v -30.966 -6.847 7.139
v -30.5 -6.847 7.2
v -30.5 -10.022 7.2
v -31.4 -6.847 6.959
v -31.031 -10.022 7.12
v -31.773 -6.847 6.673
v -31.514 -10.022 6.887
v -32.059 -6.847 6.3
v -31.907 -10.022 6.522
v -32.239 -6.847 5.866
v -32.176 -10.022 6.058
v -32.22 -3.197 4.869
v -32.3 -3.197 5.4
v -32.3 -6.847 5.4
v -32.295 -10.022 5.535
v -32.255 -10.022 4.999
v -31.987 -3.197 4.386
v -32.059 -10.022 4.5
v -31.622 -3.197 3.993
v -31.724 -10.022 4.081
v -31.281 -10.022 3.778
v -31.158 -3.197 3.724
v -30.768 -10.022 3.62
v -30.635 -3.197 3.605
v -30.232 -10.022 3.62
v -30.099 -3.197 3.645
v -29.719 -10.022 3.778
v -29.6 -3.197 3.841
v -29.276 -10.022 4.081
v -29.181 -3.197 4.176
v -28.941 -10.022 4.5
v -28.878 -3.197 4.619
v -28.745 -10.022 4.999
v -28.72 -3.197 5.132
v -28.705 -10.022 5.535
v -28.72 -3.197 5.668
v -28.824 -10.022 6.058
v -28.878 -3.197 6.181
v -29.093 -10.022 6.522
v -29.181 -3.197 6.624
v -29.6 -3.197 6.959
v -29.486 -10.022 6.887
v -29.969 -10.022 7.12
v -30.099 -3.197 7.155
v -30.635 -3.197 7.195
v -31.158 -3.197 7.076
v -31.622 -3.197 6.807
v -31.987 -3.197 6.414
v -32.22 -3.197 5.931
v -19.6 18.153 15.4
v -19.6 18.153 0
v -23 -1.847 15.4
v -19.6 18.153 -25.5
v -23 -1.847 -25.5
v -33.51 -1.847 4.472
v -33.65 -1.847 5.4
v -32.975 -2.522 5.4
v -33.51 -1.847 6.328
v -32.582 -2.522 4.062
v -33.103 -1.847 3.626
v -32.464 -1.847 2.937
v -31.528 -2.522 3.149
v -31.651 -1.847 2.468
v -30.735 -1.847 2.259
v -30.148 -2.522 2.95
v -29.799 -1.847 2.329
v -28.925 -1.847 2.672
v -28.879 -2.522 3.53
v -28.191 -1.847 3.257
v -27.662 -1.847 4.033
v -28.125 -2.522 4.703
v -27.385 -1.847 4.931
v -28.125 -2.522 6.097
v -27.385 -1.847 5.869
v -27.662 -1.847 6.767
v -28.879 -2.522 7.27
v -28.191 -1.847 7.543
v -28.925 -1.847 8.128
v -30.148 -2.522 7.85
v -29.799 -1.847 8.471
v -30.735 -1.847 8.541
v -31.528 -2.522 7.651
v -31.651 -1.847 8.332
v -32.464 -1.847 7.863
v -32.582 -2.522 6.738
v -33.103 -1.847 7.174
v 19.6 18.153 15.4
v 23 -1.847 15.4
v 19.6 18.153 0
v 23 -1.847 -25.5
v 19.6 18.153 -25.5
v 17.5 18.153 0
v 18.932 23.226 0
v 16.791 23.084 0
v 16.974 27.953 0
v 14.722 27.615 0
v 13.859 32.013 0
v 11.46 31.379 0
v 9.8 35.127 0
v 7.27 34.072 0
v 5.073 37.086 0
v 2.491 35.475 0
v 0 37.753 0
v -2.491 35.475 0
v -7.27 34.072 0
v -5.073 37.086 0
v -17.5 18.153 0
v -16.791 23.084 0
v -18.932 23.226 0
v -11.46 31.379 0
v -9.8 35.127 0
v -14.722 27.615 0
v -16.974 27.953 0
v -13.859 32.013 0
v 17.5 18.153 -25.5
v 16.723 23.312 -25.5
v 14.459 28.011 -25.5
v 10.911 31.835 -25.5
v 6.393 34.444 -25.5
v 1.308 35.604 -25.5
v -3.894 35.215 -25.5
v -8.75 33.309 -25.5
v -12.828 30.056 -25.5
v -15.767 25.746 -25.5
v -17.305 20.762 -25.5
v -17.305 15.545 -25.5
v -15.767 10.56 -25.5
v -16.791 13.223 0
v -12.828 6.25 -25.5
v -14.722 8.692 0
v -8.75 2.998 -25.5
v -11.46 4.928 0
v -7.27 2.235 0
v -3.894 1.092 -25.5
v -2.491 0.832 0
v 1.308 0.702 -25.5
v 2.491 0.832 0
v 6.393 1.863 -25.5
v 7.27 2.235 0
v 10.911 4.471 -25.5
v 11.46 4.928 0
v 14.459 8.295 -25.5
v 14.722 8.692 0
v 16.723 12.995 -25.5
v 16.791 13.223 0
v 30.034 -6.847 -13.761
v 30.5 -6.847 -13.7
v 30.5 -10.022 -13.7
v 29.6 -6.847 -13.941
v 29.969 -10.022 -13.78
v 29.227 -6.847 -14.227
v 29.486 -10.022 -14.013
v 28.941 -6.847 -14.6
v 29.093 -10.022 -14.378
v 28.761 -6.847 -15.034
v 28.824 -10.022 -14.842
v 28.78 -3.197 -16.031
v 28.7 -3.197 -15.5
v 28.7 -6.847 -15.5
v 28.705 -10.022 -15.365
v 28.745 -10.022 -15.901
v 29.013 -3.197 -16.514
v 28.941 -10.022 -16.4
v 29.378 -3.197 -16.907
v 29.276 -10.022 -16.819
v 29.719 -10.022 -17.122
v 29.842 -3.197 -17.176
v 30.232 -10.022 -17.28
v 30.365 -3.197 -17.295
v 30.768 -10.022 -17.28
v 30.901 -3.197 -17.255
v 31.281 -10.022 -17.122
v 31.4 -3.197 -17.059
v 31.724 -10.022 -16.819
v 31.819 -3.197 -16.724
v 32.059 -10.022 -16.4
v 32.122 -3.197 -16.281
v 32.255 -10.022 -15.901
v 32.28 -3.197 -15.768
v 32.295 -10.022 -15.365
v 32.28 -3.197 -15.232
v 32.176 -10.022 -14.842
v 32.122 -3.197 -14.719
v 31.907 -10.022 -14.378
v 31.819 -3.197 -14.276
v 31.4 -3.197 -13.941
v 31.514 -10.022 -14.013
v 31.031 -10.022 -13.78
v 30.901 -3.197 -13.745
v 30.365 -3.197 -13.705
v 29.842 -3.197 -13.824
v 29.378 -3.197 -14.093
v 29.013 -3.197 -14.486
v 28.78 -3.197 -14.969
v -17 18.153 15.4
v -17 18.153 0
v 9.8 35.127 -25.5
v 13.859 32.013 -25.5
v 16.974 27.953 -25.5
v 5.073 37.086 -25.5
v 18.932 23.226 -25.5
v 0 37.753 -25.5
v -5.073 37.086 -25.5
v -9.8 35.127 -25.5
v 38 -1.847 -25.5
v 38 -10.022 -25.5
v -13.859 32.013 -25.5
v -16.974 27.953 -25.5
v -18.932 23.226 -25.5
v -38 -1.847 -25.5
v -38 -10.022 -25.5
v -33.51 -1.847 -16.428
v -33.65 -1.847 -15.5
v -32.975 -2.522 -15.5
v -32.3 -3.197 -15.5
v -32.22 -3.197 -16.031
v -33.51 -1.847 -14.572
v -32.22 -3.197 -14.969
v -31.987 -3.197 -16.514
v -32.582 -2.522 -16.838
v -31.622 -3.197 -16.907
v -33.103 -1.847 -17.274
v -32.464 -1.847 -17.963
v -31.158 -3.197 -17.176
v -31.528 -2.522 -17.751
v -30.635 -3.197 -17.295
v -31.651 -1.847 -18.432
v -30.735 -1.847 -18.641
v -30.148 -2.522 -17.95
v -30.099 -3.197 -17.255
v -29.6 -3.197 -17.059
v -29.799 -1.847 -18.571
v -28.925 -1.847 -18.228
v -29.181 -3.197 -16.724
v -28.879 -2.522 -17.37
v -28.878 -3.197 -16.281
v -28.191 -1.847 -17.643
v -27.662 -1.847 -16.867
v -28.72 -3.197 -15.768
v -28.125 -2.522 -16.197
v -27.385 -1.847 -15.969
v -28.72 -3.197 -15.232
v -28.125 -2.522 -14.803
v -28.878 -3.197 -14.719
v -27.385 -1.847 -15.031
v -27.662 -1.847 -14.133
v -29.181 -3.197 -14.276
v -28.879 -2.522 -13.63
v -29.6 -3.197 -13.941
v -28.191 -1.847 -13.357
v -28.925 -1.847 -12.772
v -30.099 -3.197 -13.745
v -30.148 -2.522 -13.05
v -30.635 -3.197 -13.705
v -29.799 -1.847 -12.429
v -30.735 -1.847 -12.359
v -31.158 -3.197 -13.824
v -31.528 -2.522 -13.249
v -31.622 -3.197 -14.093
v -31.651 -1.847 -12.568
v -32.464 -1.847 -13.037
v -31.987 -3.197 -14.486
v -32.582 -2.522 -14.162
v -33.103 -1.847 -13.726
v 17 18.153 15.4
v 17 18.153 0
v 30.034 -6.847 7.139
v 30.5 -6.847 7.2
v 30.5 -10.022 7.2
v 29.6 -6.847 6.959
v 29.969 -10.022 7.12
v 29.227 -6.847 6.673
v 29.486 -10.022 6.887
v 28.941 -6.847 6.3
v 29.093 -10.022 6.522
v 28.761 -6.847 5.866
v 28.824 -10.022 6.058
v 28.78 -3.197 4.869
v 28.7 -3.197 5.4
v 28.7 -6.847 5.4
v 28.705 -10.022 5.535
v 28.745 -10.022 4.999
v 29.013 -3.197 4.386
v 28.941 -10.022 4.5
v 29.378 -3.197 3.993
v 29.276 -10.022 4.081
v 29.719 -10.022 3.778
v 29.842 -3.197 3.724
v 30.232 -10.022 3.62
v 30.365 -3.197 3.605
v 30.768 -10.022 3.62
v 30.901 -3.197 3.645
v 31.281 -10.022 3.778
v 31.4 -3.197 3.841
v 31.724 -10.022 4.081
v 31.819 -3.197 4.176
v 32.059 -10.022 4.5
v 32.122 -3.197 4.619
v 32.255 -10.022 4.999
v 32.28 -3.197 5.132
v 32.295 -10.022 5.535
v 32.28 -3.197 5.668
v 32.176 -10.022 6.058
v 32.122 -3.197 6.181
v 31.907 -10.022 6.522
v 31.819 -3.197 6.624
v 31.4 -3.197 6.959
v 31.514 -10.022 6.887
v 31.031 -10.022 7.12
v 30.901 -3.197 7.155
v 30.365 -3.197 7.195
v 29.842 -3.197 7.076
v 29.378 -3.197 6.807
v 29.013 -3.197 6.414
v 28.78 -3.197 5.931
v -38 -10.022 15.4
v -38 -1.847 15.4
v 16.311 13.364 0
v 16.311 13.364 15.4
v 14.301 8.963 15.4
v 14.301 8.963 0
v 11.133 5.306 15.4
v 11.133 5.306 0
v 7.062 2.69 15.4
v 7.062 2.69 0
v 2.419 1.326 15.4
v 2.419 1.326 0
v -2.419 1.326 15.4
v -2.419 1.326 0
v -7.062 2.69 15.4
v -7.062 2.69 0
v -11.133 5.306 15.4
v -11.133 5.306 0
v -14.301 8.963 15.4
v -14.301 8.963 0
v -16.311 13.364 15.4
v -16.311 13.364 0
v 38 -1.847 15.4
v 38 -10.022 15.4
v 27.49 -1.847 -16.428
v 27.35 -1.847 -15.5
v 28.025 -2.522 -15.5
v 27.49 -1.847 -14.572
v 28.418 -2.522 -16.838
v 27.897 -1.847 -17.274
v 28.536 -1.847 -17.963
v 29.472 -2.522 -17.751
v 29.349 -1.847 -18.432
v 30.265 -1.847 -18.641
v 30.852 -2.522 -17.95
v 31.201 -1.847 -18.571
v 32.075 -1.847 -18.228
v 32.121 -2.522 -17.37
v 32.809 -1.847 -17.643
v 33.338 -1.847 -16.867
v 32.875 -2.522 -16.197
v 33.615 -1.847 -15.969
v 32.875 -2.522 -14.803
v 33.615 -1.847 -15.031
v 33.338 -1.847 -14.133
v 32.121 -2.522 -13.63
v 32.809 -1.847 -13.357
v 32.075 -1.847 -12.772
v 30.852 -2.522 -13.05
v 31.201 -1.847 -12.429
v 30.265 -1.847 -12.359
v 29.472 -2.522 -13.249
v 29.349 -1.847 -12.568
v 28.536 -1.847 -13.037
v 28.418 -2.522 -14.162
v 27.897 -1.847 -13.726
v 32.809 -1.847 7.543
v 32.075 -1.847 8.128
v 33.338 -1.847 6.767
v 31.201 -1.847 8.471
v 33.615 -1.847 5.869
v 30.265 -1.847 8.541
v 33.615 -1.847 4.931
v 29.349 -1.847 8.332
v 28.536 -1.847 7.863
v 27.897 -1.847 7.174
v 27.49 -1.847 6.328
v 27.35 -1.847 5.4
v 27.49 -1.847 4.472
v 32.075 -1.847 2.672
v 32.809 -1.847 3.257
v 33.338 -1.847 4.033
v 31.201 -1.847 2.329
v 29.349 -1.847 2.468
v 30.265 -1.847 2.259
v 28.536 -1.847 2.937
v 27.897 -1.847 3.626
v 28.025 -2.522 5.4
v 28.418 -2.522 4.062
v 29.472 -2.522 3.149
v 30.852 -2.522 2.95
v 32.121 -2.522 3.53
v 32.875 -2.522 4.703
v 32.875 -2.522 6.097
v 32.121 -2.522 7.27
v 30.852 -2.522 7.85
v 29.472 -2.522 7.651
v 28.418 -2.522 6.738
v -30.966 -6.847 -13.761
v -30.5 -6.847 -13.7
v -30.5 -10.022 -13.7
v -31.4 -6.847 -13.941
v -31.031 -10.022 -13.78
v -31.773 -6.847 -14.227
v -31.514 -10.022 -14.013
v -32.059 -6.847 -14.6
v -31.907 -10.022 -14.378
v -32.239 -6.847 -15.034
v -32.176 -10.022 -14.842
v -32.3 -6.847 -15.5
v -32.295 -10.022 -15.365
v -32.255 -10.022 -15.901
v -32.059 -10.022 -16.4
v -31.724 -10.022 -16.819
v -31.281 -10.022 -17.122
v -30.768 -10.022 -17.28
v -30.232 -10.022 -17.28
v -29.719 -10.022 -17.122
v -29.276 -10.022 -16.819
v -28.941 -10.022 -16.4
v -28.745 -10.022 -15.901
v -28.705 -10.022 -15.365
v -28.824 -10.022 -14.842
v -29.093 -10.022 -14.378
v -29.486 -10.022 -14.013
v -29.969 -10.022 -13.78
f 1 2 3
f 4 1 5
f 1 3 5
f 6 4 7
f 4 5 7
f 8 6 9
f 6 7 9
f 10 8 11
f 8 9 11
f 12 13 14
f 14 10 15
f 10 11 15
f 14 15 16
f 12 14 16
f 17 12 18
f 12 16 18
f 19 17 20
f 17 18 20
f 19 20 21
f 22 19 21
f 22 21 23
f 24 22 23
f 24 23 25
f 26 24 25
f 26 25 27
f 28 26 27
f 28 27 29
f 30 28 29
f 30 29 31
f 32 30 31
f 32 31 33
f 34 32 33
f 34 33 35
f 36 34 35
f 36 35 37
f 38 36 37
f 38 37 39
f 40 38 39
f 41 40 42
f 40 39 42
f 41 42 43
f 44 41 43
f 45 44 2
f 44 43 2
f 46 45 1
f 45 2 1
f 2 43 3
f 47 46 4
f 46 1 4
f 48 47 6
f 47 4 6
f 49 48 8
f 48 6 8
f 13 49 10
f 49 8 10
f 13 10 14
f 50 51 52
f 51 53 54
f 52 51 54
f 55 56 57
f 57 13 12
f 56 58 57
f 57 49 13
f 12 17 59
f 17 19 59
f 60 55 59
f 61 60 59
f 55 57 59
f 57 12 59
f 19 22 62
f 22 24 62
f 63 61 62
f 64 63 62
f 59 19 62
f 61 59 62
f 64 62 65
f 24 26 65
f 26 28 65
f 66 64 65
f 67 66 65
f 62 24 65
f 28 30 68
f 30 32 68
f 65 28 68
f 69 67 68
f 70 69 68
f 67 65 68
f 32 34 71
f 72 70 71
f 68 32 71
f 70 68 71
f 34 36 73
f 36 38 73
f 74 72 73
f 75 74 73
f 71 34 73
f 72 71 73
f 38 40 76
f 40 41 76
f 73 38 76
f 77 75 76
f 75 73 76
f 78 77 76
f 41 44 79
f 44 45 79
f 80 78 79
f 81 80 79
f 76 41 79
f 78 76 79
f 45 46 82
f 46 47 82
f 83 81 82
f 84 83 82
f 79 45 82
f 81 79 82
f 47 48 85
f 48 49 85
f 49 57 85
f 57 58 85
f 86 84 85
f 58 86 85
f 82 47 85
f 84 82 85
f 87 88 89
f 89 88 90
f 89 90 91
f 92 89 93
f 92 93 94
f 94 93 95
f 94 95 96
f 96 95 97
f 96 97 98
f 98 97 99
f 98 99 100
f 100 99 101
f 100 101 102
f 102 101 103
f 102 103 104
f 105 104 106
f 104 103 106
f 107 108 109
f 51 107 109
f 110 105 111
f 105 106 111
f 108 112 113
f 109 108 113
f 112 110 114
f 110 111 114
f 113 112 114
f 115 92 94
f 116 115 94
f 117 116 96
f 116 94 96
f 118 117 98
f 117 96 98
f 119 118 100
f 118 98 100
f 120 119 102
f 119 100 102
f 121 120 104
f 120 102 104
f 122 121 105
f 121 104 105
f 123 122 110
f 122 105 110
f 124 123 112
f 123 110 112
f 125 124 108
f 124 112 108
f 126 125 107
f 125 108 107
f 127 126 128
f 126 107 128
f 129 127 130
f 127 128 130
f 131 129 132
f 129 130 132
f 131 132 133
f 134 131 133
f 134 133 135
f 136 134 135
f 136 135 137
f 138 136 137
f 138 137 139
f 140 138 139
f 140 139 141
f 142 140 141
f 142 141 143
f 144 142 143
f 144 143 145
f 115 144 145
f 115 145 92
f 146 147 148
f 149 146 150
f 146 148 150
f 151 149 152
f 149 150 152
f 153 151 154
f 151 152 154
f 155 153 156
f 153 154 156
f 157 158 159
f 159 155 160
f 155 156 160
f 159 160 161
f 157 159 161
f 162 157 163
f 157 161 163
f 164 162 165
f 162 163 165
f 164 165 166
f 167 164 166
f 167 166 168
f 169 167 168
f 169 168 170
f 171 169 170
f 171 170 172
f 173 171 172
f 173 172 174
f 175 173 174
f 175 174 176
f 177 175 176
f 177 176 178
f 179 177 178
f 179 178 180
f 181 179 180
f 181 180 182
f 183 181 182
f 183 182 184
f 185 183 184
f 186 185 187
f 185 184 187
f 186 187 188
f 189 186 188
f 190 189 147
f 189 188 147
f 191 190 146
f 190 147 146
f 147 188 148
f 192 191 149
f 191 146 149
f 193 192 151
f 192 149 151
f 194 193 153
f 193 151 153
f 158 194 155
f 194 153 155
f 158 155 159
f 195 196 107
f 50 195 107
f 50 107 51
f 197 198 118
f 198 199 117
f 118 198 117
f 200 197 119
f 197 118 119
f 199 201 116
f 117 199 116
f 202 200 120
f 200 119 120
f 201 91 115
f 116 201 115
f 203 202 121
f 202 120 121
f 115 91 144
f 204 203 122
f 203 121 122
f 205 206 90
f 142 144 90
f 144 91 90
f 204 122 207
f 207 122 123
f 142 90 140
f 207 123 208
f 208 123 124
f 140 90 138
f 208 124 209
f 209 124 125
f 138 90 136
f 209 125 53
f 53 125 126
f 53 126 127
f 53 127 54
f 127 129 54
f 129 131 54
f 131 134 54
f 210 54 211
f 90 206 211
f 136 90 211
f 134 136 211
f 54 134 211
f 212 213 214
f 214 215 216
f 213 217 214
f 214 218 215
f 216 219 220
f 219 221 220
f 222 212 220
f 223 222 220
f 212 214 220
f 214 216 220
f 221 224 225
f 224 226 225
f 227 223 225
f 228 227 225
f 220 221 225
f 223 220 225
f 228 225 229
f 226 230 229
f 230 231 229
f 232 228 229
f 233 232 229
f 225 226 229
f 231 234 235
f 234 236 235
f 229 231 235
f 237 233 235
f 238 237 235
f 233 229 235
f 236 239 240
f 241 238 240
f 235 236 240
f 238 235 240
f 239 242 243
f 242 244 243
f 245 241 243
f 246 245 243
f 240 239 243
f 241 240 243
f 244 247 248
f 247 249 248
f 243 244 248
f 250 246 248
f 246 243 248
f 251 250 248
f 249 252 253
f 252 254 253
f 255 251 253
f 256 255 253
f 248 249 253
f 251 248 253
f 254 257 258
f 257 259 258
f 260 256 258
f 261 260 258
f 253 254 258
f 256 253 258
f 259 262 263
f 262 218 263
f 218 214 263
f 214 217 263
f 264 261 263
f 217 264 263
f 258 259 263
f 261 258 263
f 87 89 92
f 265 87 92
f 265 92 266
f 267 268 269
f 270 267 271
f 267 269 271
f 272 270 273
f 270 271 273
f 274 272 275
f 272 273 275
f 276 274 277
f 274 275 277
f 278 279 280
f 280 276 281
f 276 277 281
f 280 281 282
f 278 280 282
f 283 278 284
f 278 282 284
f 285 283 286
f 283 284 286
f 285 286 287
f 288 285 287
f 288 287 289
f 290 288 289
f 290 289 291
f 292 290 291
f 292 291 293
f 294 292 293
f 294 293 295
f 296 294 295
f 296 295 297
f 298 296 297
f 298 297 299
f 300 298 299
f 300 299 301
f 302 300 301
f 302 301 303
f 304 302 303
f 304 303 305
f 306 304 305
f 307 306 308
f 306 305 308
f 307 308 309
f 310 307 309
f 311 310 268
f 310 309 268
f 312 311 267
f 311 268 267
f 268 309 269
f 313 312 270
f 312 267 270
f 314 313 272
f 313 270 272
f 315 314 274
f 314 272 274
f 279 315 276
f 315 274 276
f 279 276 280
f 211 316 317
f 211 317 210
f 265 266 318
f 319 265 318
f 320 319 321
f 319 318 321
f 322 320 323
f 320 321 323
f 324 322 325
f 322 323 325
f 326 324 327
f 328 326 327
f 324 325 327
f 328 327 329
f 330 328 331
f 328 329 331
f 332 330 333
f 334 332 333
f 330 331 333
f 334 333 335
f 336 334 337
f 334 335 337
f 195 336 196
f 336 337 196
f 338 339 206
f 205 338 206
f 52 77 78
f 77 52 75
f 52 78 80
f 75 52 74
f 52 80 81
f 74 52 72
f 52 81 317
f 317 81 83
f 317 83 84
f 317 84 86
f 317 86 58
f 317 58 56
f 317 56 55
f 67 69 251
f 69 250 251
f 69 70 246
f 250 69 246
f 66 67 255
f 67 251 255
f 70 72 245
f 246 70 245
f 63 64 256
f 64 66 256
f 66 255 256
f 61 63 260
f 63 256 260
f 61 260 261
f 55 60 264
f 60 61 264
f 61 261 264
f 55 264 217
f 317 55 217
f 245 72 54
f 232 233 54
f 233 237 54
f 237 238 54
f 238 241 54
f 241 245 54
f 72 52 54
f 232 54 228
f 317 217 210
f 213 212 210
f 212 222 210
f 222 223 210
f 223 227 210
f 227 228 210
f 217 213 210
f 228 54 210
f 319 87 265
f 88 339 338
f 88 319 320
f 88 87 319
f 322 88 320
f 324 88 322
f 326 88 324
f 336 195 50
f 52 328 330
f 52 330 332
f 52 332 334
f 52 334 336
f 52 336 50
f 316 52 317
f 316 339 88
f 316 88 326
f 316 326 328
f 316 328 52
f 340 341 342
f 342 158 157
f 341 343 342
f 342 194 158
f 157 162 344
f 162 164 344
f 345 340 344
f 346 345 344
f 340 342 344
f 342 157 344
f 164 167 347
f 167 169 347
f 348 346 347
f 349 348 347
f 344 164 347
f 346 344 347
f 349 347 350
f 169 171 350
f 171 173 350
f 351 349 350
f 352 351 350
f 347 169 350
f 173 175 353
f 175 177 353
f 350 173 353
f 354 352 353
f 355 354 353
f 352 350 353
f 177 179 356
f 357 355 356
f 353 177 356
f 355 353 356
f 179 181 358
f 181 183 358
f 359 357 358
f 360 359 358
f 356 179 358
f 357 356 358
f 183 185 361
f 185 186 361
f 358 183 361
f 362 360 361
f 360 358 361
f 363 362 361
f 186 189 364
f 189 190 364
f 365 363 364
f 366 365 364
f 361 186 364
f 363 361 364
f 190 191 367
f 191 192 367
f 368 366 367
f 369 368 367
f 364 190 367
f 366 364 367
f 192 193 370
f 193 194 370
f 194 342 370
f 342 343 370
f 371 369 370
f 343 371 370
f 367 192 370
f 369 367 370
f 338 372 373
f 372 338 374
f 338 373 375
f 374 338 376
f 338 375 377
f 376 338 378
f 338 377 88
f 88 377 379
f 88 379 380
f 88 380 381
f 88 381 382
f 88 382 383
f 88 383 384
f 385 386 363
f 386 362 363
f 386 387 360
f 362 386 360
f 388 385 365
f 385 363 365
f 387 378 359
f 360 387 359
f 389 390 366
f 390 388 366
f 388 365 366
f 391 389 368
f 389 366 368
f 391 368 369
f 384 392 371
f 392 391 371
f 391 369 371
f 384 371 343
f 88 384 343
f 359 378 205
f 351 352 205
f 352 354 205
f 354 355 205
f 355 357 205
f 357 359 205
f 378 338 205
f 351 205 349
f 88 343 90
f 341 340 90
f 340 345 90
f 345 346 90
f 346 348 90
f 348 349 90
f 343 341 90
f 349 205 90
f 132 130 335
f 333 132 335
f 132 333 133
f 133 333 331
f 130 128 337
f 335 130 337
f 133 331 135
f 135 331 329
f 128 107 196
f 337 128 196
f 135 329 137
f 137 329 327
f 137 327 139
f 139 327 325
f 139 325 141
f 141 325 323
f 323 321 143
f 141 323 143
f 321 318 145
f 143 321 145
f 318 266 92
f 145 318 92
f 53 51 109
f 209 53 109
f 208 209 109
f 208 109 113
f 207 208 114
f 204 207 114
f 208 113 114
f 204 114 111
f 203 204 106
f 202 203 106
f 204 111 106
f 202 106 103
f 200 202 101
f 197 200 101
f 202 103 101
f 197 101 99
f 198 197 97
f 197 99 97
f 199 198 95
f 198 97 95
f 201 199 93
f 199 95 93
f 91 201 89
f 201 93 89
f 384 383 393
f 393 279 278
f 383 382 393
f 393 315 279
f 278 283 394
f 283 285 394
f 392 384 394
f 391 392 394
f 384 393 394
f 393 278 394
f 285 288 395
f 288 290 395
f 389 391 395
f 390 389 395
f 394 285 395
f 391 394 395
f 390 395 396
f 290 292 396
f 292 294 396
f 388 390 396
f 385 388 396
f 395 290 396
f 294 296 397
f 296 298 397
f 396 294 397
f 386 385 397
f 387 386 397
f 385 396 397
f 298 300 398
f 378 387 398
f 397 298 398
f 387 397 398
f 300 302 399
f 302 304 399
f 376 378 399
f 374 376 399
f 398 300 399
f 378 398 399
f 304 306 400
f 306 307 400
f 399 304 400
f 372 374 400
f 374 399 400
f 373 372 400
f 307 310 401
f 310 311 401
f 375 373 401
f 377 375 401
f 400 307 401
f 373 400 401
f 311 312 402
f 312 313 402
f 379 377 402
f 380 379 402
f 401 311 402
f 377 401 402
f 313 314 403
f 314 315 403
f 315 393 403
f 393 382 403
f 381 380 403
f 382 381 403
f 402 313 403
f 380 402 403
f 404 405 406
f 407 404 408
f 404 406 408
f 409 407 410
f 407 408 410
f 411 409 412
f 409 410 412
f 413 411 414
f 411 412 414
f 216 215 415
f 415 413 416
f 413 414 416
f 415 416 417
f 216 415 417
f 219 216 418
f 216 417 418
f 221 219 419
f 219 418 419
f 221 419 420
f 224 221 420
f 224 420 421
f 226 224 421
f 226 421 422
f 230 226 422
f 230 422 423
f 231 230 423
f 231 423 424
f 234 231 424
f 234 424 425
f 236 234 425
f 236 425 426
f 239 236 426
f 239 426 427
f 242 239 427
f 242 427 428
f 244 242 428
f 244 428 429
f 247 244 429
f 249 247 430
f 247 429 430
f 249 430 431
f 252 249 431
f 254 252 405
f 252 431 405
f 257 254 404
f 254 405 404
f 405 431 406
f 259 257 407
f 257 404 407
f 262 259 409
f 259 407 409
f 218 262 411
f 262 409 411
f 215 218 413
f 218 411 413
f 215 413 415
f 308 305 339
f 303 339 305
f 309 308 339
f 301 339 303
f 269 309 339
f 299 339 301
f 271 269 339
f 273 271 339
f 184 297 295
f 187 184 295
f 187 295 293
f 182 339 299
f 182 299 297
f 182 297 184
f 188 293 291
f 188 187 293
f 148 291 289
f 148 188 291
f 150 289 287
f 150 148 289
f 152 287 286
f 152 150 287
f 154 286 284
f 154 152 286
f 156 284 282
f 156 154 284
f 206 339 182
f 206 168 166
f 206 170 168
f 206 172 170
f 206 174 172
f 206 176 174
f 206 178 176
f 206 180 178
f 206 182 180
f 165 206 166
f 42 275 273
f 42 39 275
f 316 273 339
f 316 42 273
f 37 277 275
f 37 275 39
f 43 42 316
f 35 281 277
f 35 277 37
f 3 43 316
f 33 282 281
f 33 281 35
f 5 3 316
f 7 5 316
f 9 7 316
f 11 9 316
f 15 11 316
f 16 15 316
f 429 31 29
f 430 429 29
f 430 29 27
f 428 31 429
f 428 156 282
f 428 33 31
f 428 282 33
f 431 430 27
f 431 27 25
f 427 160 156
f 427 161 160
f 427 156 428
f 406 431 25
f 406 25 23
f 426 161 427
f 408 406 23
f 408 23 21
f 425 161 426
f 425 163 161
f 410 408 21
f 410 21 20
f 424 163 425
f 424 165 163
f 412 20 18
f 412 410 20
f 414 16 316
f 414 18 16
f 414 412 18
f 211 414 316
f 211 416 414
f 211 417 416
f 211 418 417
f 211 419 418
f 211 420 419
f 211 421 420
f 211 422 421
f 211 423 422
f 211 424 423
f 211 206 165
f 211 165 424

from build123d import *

# Parameters (mm, degrees)
SKETCH1_R                                       = 17.5
BOSS_EXTRUDE9_DEPTH                             = 25.5
BOSS_EXTRUDE10_DEPTH                            = 15.4
BOSS_EXTRUDE10_DEPTH_BACK                       = 25.5
CSK_FOR_M3_FLAT_HEAD_MACHINE_SCREW1_D           = 3.6
CSK_FOR_M3_FLAT_HEAD_MACHINE_SCREW1_CSINK_D     = 6.3
CSK_FOR_M3_FLAT_HEAD_MACHINE_SCREW1_CSINK_ANGLE = 90
CSK_FOR_M3_FLAT_HEAD_MACHINE_SCREW2_D           = 3.6
CSK_FOR_M3_FLAT_HEAD_MACHINE_SCREW2_CSINK_D     = 6.3
CSK_FOR_M3_FLAT_HEAD_MACHINE_SCREW2_CSINK_ANGLE = 90
BOSS_EXTRUDE11_DEPTH                            = 15.4
BOSS_EXTRUDE12_START                            = 3.175
SKETCH15_W                                      = 76
SKETCH15_H                                      = 40.9
SKETCH15_R                                      = 1.8
BOSS_EXTRUDE12_DEPTH                            = 3.175


with BuildPart() as part:
    # Sketch1 → Boss-Extrude9 (new body)
    with BuildSketch(Plane.XY):
        with BuildLine():
            ThreePointArc((-19.6, 18.153395679), (0, 37.753395679), (19.6, 18.153395679))
            ThreePointArc((19.6, 18.153395679), (0, -1.446604321), (-19.6, 18.153395679))
        make_face()
        with Locations((0, 18.153395679)):
            Circle(SKETCH1_R, mode=Mode.SUBTRACT)
    extrude(amount=-BOSS_EXTRUDE9_DEPTH)

    # Sketch1<15> → Boss-Extrude10 (add, two sides: drawn at the far end of the back side and taken through both)
    with BuildSketch(Plane.XY.offset(-BOSS_EXTRUDE10_DEPTH_BACK)):
        with BuildLine():
            Line((-23, -1.846604321), (-38, -1.846604321))
            Line((-38, -1.846604321), (-38, -6.846604321))
            Line((-38, -6.846604321), (38, -6.846604321))
            Line((38, -6.846604321), (38, -1.846604321))
            Line((38, -1.846604321), (23, -1.846604321))
            Line((23, -1.846604321), (19.6, 18.153395679))
            ThreePointArc((19.6, 18.153395679), (0, -1.446604321), (-19.6, 18.153395679))
            Line((-19.6, 18.153395679), (-23, -1.846604321))
        make_face()
    extrude(amount=BOSS_EXTRUDE10_DEPTH + BOSS_EXTRUDE10_DEPTH_BACK)

    # CSK for M3 Flat Head Machine Screw1 (through all)
    with Locations(Plane(origin=(0, -1.846604321, 0), x_dir=(1, 0, 0), z_dir=(0, 1, 0))):
        with Locations((-30.5, 15.5), (-30.5, -5.4)):
            CounterSinkHole(CSK_FOR_M3_FLAT_HEAD_MACHINE_SCREW1_D / 2, CSK_FOR_M3_FLAT_HEAD_MACHINE_SCREW1_CSINK_D / 2, counter_sink_angle=CSK_FOR_M3_FLAT_HEAD_MACHINE_SCREW1_CSINK_ANGLE)

    # CSK for M3 Flat Head Machine Screw2 (through all)
    with Locations(Plane(origin=(0, -1.846604321, 0), x_dir=(1, 0, 0), z_dir=(0, 1, 0))):
        with Locations((30.5, -5.4), (30.5, 15.5)):
            CounterSinkHole(CSK_FOR_M3_FLAT_HEAD_MACHINE_SCREW2_D / 2, CSK_FOR_M3_FLAT_HEAD_MACHINE_SCREW2_CSINK_D / 2, counter_sink_angle=CSK_FOR_M3_FLAT_HEAD_MACHINE_SCREW2_CSINK_ANGLE)

    # Sketch1<19> → Boss-Extrude11 (add)
    with BuildSketch(Plane.XY):
        with BuildLine():
            ThreePointArc((-19.6, 18.153395679), (0, -1.446604321), (19.6, 18.153395679))
            Line((19.6, 18.153395679), (17, 18.153395679))
            ThreePointArc((17, 18.153395679), (0, 1.153395679), (-17, 18.153395679))
            Line((-17, 18.153395679), (-19.6, 18.153395679))
        make_face()
    extrude(amount=BOSS_EXTRUDE11_DEPTH)

    # Sketch15 → Boss-Extrude12 (add)
    with BuildSketch(Plane(origin=(0, -6.846604321, 0), x_dir=(-1, 0, 0), z_dir=(0, -1, 0)).offset(BOSS_EXTRUDE12_START)):
        with Locations((0, 5.05)):
            Rectangle(SKETCH15_W, SKETCH15_H)
        with Locations((-30.5, -5.4)):
            Circle(SKETCH15_R, mode=Mode.SUBTRACT)
        with Locations((30.5, -5.4)):
            Circle(SKETCH15_R, mode=Mode.SUBTRACT)
        with Locations((-30.5, 15.5)):
            Circle(SKETCH15_R, mode=Mode.SUBTRACT)
        with Locations((30.5, 15.5)):
            Circle(SKETCH15_R, mode=Mode.SUBTRACT)
    extrude(amount=-BOSS_EXTRUDE12_DEPTH)


solid = part.part
